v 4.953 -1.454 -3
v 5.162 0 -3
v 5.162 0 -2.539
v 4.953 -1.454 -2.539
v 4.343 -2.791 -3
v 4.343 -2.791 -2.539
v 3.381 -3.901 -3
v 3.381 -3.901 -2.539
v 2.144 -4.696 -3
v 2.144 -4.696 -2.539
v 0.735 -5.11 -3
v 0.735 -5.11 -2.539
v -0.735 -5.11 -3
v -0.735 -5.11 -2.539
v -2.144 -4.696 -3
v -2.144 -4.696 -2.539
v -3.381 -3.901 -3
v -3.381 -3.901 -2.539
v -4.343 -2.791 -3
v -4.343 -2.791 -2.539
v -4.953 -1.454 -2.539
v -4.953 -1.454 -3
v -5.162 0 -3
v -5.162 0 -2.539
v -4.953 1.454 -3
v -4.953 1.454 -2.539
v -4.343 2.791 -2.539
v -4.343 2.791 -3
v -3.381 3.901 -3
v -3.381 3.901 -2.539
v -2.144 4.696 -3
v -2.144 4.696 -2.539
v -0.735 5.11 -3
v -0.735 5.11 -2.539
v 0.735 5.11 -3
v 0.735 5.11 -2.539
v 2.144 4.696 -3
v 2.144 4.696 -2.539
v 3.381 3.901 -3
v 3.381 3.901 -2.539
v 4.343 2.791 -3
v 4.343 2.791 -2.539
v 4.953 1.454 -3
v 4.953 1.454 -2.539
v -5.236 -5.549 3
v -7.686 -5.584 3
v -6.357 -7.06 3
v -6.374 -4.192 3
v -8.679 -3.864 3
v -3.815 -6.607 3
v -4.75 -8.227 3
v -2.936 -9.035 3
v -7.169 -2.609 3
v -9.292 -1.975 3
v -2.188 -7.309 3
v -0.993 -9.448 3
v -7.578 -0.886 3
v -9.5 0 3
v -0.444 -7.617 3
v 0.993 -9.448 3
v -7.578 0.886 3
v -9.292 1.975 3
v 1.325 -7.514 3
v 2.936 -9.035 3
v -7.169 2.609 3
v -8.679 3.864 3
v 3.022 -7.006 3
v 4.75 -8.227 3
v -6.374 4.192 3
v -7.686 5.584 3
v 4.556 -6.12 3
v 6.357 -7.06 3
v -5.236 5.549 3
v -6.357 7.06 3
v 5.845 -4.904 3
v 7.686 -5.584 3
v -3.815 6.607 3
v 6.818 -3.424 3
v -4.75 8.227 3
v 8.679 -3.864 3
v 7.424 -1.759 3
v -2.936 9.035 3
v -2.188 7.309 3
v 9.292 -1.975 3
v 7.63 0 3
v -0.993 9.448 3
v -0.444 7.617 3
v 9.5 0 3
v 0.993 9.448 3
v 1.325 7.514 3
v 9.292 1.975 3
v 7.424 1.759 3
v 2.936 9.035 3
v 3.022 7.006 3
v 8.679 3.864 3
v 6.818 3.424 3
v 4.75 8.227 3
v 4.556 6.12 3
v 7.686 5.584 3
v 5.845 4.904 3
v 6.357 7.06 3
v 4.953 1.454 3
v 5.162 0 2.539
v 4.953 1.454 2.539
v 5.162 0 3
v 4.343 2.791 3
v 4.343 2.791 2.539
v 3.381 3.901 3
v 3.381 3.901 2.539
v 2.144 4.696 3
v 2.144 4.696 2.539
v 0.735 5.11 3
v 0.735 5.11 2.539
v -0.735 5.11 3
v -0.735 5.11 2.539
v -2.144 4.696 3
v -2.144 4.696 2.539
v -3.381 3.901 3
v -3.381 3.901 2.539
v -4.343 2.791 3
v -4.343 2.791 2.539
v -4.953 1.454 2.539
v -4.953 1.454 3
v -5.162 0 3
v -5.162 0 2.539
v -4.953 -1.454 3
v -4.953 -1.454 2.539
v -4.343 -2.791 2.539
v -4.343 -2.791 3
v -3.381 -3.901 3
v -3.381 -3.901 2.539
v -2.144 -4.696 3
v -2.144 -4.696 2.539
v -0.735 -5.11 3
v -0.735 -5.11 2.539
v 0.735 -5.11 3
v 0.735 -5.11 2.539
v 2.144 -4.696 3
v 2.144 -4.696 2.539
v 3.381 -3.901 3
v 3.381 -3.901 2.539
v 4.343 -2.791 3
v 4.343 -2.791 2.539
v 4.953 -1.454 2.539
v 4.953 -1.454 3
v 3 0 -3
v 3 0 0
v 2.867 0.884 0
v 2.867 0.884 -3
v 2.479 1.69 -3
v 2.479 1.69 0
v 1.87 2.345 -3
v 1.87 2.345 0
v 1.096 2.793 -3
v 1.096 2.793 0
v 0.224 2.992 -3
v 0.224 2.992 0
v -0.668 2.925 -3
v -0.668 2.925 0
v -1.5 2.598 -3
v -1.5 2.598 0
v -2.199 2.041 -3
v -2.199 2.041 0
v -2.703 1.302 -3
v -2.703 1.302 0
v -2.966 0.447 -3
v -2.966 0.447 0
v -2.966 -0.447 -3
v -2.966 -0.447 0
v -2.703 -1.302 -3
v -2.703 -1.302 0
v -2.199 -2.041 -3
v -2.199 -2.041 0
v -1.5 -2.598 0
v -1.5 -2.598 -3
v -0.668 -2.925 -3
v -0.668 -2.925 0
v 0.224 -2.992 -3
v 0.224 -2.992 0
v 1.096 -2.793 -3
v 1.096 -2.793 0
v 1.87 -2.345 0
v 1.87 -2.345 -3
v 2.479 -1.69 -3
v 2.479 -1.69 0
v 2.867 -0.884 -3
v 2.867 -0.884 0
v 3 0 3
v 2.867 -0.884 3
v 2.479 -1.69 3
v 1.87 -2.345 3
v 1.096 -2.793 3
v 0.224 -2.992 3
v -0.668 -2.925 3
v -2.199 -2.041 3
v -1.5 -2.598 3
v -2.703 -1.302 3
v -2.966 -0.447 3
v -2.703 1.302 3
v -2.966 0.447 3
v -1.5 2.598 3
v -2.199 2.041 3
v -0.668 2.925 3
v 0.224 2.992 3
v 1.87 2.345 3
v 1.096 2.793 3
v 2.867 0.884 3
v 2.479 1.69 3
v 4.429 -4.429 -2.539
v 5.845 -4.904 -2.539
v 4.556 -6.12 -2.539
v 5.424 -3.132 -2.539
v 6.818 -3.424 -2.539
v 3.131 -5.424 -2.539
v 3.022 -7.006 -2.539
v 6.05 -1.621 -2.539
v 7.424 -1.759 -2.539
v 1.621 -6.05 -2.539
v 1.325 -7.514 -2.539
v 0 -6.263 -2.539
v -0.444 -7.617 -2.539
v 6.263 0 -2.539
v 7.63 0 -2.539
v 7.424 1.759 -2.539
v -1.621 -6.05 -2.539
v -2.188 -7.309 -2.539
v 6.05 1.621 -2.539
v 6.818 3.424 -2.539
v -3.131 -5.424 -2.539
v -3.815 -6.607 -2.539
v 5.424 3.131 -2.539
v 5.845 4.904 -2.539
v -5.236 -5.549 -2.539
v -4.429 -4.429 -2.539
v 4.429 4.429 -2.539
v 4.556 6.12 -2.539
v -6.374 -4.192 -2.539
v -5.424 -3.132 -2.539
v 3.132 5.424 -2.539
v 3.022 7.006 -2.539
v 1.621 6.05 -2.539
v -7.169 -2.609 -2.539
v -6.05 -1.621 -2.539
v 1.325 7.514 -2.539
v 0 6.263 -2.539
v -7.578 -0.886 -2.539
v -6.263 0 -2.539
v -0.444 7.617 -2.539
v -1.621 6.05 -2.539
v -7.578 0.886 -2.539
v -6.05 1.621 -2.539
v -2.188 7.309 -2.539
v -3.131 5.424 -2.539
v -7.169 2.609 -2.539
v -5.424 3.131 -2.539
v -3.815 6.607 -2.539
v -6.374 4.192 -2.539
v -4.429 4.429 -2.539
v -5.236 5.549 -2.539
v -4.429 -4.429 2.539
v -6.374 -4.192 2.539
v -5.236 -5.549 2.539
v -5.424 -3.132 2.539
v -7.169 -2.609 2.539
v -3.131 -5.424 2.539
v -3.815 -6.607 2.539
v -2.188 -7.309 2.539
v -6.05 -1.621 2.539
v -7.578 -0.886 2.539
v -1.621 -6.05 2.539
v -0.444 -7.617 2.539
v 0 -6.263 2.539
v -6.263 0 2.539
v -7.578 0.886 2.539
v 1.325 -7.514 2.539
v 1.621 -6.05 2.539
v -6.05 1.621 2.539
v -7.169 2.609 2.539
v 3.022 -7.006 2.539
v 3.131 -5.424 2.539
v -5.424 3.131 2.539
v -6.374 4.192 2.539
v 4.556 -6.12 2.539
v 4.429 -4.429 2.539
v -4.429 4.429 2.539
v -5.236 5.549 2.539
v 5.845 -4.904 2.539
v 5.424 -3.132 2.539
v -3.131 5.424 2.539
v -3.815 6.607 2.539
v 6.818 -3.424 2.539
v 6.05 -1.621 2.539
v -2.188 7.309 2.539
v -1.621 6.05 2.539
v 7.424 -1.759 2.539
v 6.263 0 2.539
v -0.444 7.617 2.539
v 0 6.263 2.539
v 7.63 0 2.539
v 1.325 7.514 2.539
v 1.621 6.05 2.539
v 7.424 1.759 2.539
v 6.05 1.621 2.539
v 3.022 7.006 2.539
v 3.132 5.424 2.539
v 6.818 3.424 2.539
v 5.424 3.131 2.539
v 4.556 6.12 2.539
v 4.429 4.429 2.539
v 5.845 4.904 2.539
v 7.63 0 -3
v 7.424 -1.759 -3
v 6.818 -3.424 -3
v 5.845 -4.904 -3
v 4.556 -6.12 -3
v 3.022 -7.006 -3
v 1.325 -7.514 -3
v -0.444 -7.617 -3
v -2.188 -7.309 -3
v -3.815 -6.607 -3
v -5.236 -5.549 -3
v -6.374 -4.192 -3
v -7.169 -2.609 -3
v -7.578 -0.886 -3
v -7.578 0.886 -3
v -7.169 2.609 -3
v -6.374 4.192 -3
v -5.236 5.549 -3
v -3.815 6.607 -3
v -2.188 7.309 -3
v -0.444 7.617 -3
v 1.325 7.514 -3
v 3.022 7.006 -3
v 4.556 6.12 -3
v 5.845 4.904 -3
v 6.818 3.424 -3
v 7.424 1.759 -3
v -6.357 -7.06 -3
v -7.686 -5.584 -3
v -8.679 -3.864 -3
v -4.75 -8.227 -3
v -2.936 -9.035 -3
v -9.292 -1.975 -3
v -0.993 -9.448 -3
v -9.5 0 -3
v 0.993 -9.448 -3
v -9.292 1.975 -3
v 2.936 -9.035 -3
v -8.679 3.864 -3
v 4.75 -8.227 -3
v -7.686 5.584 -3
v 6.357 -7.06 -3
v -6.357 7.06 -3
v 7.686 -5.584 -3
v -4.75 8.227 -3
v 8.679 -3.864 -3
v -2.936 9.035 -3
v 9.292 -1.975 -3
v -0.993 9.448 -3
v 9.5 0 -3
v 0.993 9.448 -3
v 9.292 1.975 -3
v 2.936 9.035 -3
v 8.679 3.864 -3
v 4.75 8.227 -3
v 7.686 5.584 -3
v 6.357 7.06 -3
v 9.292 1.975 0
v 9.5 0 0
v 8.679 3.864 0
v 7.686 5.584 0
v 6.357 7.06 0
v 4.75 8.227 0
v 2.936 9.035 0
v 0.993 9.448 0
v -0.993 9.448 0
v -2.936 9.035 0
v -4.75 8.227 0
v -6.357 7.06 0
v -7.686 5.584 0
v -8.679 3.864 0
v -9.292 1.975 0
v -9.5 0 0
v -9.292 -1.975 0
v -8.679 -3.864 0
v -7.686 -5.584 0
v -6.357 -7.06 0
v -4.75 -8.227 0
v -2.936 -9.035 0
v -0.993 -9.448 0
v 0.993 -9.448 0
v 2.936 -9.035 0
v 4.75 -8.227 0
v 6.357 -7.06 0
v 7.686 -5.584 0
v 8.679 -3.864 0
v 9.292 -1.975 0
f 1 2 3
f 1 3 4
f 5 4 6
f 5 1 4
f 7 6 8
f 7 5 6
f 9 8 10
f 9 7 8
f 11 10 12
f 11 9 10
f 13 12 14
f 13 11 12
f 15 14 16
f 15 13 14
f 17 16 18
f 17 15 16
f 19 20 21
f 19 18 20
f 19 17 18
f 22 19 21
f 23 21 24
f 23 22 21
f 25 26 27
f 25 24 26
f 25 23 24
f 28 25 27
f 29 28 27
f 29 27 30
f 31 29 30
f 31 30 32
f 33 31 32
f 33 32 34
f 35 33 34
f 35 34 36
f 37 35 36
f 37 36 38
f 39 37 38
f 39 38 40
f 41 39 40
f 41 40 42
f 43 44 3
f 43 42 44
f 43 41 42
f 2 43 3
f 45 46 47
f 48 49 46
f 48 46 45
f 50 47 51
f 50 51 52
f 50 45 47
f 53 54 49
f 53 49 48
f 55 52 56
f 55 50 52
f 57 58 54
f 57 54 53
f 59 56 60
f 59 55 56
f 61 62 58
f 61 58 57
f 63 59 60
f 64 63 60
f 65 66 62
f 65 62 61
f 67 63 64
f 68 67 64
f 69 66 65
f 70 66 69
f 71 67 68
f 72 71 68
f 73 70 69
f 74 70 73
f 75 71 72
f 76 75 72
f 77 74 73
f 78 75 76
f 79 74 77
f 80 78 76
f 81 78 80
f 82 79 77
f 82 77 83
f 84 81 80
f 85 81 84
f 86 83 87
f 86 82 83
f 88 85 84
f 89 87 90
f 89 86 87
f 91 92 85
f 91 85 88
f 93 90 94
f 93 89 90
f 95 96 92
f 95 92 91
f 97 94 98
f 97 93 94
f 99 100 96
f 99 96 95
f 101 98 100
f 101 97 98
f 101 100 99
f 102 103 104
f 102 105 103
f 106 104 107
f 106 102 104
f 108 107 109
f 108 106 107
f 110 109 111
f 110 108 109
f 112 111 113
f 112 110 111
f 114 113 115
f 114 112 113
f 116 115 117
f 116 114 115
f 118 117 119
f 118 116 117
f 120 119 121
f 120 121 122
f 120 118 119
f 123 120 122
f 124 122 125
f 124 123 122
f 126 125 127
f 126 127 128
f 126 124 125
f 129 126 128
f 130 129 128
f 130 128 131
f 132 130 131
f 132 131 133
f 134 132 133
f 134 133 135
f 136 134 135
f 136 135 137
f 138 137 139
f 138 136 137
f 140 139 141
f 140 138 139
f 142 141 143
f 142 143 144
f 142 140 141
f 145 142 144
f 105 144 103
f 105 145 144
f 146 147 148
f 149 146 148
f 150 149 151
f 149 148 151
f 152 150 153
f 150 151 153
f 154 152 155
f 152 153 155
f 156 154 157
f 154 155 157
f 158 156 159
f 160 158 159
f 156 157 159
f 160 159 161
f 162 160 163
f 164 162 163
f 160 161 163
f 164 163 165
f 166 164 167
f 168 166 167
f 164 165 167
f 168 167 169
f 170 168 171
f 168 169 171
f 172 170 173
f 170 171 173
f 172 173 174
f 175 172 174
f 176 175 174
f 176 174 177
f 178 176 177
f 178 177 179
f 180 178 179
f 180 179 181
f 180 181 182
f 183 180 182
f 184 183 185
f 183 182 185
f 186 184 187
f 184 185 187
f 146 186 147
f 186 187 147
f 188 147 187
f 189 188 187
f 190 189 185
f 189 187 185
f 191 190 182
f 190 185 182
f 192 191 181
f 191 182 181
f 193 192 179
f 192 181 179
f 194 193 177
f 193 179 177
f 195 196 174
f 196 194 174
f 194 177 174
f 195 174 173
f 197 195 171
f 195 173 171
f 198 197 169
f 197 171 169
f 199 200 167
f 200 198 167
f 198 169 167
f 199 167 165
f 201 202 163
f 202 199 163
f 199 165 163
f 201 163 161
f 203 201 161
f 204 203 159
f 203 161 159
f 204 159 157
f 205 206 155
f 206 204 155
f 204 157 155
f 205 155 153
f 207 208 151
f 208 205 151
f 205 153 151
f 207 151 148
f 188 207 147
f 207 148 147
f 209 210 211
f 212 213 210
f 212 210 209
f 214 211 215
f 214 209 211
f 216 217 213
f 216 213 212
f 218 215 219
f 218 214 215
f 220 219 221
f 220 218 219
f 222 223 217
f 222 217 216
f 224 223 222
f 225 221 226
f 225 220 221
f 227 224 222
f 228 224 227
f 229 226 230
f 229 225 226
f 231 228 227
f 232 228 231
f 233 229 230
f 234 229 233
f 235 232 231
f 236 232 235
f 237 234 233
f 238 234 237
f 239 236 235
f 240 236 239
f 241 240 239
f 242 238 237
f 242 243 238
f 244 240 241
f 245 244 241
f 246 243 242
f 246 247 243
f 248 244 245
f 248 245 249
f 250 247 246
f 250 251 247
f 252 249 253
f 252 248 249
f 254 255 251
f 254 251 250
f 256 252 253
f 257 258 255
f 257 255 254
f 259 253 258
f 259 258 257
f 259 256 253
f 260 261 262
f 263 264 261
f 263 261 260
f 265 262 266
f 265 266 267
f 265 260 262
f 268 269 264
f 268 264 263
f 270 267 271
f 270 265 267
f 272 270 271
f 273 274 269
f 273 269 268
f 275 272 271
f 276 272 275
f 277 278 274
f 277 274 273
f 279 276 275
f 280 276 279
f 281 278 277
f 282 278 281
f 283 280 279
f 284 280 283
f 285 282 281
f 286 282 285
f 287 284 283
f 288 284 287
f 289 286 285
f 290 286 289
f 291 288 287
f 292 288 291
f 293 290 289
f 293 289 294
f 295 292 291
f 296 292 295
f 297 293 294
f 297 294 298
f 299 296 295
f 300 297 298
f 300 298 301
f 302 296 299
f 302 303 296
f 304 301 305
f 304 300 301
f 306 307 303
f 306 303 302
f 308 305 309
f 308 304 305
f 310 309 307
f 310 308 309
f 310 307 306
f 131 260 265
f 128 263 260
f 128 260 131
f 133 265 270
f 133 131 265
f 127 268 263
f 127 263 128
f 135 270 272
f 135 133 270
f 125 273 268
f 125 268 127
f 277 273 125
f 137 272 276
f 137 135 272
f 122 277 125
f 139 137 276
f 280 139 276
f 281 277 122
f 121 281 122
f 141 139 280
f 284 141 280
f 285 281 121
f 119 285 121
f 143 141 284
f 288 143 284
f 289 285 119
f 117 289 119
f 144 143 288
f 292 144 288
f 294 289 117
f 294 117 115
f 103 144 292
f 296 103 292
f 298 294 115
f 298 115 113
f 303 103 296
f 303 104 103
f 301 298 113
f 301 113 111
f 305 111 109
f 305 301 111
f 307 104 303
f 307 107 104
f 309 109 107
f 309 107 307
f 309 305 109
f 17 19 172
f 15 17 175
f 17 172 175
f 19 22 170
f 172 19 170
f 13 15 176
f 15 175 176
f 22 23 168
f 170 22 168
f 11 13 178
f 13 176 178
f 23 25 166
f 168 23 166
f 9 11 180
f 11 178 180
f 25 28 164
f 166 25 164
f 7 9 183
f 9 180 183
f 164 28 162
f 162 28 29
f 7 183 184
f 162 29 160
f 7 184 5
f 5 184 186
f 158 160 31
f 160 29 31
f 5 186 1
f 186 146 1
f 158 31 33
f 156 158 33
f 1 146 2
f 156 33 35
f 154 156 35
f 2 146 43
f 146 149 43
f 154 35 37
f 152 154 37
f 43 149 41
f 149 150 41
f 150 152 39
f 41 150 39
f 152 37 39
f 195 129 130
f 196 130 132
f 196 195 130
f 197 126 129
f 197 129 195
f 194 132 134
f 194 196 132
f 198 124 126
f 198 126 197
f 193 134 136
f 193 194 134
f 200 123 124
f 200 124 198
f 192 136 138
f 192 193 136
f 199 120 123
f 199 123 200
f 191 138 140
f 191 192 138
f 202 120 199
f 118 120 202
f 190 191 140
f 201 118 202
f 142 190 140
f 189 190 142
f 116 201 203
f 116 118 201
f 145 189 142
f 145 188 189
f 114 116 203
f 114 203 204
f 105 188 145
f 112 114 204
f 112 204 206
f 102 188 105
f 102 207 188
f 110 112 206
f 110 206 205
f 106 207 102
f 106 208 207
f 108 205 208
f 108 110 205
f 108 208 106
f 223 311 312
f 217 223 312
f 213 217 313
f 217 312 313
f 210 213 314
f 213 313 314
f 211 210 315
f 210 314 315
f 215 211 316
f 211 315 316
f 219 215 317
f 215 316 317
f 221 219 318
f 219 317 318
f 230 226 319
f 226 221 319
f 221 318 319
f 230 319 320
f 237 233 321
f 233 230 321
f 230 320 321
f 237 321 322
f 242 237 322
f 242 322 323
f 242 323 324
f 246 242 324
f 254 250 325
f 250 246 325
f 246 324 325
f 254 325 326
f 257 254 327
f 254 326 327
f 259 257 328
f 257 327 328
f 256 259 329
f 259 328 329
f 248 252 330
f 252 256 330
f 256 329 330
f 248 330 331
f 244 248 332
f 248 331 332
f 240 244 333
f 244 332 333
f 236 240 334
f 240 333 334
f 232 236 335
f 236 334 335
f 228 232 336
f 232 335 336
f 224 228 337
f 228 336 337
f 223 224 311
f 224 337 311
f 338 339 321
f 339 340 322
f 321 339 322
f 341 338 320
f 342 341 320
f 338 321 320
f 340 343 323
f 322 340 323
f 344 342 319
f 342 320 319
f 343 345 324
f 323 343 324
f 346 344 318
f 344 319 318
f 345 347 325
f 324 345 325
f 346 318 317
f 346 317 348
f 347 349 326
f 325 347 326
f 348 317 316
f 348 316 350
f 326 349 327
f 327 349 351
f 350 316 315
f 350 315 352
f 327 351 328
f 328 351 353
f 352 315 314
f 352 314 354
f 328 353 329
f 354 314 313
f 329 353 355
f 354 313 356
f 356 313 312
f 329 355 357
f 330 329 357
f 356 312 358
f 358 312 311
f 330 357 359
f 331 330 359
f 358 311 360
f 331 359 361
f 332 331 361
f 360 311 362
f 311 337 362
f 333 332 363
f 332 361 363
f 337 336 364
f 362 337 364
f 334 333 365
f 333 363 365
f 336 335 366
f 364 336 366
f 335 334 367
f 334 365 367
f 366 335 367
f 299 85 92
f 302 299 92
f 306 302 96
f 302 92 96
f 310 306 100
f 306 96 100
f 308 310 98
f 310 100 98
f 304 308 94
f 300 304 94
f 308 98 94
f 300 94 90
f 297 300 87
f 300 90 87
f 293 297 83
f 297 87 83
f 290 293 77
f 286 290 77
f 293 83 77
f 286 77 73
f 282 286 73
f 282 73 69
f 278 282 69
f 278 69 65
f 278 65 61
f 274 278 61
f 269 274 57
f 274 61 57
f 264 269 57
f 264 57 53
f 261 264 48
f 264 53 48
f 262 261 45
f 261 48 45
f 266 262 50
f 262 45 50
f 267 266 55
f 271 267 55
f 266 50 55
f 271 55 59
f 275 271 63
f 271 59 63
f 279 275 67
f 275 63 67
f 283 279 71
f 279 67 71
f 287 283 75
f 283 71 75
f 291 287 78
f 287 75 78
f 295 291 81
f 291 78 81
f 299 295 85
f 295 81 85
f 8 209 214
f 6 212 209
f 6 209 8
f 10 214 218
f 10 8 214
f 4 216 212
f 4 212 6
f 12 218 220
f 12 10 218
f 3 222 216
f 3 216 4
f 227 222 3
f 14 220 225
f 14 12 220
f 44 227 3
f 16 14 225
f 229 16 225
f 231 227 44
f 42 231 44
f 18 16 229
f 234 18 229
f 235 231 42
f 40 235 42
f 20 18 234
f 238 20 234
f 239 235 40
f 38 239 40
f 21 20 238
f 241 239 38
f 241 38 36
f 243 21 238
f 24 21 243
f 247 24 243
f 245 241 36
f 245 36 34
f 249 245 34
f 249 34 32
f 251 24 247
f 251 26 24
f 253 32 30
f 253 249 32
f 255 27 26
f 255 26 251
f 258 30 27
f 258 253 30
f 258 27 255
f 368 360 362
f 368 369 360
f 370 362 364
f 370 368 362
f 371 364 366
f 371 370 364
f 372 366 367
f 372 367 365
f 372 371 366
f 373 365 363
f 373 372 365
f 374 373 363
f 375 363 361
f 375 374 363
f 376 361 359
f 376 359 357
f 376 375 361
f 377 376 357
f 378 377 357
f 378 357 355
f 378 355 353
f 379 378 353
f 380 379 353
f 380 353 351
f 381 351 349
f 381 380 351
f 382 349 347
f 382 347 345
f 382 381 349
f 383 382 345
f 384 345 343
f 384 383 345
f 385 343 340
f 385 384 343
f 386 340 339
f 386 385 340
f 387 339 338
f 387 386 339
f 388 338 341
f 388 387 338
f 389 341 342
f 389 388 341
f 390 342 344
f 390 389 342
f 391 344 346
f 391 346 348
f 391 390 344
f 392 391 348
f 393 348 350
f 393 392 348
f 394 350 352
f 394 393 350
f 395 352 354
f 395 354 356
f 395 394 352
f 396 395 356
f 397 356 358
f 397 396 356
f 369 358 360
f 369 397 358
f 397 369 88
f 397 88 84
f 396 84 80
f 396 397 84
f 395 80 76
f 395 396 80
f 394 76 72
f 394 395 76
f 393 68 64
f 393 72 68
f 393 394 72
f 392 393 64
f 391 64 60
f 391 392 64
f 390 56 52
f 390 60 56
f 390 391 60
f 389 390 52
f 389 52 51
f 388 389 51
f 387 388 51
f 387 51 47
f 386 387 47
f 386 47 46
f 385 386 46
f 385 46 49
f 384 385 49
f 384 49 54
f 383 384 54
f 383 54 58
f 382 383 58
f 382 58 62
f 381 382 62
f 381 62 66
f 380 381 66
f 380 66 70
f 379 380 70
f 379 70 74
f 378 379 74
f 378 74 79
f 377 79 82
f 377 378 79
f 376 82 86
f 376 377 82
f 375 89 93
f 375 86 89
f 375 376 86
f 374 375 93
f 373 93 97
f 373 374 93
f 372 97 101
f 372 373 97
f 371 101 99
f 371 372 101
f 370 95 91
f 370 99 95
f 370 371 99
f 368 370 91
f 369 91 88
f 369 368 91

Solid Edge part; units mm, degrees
sketch "Sketch1" plane through (0, 0, 0) normal (0, 0, 1) x (1, 0, 0)
  circle A0 centre (0, 0) radius 3
  circle A1 centre (0, 0) radius 9.5
  dimension "D1" = 6
  dimension "D2" = 19
extrude "Protrusion1" add sketch "Sketch1" along normal mid plane 6
sketch "Sketch2" plane through (0, 0, 0) normal (0, -1, 0) x (1, 0, 0)
  line L0 (7.6295, 2.5394) -> (7.6295, 3.4504)
  line L1 (6.263, 2.5394) -> (7.6295, 2.5394)
  line L2 (6.263, 2.5394) -> (5.1623, 2.5394)
  line L3 (5.1623, 2.5394) -> (5.1623, 3.4504)
revolve "RevolvedCutout1" cut sketch "Sketch2" angle 360 about axis through (0, 0, -54) along (0, 0, 1) material side at (7.5795, 0, 2.9949)
mirror "Mirror1" about plane through (0, 0, 0) normal (0, 0, 1) of "RevolvedCutout1"
